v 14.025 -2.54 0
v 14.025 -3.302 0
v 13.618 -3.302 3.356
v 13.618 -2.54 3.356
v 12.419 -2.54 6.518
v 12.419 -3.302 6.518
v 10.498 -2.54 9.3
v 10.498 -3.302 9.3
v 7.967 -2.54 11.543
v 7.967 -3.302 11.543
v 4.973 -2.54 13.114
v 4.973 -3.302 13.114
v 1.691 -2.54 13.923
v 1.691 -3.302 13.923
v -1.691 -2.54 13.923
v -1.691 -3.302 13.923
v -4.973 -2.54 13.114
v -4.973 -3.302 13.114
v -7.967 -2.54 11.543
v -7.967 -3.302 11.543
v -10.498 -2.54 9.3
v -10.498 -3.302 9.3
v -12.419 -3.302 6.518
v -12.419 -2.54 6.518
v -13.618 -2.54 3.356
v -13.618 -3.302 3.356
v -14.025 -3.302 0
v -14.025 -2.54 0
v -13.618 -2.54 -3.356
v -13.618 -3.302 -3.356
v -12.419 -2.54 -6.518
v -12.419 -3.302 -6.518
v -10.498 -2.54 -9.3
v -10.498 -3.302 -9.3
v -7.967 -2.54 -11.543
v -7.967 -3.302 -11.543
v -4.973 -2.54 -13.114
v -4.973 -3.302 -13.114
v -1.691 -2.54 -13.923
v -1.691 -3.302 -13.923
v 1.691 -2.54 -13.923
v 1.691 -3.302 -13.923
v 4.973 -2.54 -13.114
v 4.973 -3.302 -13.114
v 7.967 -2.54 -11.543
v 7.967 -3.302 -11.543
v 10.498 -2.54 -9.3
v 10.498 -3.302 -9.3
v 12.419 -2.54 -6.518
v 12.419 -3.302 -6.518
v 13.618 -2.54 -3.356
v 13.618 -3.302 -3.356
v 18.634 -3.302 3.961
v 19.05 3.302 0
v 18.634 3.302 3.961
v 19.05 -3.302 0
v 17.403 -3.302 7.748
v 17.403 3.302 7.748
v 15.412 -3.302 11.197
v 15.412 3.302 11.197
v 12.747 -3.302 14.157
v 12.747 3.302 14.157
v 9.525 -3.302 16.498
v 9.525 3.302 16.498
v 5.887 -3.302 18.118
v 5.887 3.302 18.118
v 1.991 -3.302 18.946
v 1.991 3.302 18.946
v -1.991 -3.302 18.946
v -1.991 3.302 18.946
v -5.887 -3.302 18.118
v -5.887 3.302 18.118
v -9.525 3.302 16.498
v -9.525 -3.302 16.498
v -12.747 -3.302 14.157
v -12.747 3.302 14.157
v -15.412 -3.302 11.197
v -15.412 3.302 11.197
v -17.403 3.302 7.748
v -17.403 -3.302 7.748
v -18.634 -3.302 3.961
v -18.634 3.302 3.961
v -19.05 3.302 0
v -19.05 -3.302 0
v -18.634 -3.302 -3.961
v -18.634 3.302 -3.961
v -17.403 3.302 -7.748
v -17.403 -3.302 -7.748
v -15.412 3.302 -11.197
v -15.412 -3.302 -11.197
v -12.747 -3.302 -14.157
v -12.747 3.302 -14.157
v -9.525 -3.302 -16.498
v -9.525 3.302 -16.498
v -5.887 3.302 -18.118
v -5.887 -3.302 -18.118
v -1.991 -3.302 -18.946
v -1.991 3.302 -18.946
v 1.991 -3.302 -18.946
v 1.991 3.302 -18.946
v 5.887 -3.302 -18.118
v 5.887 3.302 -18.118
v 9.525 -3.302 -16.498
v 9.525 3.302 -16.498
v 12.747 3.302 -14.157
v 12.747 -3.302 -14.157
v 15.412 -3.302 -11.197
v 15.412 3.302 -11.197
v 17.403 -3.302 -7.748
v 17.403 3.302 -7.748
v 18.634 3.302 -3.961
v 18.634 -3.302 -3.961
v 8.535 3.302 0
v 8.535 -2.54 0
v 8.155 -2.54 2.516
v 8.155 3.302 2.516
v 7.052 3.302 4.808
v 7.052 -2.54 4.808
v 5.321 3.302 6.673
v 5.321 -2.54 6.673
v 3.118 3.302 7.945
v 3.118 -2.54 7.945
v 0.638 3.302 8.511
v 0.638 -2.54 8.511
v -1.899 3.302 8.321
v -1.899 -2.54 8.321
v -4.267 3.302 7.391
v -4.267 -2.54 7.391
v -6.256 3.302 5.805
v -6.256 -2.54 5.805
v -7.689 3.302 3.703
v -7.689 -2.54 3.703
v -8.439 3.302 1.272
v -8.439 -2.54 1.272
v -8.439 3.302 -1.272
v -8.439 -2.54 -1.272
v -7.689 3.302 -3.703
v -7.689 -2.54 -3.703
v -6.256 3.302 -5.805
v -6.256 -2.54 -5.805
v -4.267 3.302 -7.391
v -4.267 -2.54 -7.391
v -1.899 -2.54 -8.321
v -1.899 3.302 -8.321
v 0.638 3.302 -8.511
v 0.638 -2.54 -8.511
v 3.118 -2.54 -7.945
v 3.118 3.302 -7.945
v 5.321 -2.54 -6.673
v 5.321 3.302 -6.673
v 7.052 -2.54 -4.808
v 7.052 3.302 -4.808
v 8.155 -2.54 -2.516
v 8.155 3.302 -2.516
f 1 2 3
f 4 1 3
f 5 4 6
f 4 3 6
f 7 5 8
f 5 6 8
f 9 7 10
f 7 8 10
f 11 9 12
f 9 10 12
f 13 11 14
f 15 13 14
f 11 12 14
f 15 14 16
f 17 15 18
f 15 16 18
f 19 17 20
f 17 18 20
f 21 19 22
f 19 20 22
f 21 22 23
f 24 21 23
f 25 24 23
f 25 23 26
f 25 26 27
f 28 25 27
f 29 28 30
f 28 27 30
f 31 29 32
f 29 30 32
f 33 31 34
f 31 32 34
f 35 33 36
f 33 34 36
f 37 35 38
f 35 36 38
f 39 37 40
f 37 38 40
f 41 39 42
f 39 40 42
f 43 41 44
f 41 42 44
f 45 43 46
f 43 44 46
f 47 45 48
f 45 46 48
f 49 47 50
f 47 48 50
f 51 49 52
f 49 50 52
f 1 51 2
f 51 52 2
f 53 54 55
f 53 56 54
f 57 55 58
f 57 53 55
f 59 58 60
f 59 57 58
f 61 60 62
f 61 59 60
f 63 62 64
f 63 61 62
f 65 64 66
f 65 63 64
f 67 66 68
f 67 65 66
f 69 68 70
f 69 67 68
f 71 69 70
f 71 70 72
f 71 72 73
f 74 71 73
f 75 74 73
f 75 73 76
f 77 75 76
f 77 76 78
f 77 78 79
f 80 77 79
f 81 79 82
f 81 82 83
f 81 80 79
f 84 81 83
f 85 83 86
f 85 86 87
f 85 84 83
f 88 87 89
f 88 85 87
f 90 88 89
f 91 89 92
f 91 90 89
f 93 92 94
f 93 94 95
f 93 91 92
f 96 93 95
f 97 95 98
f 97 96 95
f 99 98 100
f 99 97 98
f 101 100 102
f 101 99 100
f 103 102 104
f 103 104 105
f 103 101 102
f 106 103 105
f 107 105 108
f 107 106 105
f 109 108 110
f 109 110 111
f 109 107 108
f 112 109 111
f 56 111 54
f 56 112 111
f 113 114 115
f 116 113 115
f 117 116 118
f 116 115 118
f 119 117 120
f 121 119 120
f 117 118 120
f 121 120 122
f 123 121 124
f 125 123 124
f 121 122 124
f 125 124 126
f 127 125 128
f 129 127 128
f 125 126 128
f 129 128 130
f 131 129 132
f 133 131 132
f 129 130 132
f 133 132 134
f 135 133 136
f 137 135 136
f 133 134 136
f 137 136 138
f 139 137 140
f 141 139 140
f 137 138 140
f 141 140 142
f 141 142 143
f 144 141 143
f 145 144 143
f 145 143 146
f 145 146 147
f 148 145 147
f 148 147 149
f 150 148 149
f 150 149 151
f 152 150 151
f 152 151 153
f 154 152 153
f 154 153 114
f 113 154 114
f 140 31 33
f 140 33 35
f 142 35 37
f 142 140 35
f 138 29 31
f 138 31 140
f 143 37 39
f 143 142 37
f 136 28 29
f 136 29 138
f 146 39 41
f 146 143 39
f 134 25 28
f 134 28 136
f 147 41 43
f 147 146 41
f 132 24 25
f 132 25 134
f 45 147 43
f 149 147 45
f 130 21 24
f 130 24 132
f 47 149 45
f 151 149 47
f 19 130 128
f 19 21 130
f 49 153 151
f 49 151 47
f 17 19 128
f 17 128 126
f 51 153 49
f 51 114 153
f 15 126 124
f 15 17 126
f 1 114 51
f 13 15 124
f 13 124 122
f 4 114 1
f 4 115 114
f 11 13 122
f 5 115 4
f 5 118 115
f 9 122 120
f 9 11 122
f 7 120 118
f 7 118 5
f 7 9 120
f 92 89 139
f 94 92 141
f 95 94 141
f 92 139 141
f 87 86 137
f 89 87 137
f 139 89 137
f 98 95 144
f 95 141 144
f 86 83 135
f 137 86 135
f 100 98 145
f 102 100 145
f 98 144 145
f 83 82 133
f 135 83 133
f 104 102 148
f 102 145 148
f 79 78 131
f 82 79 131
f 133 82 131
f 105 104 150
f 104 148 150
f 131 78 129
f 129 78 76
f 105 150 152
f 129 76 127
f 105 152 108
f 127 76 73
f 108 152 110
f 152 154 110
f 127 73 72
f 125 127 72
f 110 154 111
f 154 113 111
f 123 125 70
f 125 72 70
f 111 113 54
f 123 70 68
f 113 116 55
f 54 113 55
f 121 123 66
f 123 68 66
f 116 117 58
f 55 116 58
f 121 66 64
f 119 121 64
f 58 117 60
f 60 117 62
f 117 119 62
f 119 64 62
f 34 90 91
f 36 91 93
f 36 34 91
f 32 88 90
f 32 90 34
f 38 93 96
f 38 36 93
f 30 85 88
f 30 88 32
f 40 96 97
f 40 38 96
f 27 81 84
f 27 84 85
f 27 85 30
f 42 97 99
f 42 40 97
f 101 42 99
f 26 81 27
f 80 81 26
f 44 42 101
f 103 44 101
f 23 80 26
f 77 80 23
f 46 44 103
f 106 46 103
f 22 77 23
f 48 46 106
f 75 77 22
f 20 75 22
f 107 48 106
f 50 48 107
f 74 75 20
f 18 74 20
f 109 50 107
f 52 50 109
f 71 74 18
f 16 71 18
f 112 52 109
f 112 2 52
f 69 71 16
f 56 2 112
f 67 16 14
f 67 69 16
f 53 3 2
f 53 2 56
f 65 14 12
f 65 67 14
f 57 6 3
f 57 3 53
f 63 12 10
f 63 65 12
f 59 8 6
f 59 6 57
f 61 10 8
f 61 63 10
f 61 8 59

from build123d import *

# Parameters (mm, degrees)
F0_R     = 19.05
F1_DEPTH = 3.302
F2_R     = 8.5345501525
F3_DEPTH = 6.605
F4_R     = 14.0253085835
F4_R_2   = 8.5345501525
F5_DEPTH = 0.762


# Not quite as in the source:
# - a feature names something its author has since deleted; it is built from what else it names


with BuildPart() as f1:
    # F0 (on Front) → F1 (new body, symmetric)
    with BuildSketch(Plane.XZ):
        Circle(F0_R)
    extrude(amount=F1_DEPTH, both=True)

    # F2 (on face) → F3 (cut, through all)
    with BuildSketch(Plane.XZ.offset(3.302)):
        Circle(F2_R)
    extrude(amount=-F3_DEPTH, mode=Mode.SUBTRACT)

    # F4 (on face) → F5 (cut)
    with BuildSketch(Plane.XZ.offset(3.302)):
        Circle(F4_R)
        Circle(F4_R_2, mode=Mode.SUBTRACT)
    extrude(amount=-F5_DEPTH, mode=Mode.SUBTRACT)


solid = f1.part
